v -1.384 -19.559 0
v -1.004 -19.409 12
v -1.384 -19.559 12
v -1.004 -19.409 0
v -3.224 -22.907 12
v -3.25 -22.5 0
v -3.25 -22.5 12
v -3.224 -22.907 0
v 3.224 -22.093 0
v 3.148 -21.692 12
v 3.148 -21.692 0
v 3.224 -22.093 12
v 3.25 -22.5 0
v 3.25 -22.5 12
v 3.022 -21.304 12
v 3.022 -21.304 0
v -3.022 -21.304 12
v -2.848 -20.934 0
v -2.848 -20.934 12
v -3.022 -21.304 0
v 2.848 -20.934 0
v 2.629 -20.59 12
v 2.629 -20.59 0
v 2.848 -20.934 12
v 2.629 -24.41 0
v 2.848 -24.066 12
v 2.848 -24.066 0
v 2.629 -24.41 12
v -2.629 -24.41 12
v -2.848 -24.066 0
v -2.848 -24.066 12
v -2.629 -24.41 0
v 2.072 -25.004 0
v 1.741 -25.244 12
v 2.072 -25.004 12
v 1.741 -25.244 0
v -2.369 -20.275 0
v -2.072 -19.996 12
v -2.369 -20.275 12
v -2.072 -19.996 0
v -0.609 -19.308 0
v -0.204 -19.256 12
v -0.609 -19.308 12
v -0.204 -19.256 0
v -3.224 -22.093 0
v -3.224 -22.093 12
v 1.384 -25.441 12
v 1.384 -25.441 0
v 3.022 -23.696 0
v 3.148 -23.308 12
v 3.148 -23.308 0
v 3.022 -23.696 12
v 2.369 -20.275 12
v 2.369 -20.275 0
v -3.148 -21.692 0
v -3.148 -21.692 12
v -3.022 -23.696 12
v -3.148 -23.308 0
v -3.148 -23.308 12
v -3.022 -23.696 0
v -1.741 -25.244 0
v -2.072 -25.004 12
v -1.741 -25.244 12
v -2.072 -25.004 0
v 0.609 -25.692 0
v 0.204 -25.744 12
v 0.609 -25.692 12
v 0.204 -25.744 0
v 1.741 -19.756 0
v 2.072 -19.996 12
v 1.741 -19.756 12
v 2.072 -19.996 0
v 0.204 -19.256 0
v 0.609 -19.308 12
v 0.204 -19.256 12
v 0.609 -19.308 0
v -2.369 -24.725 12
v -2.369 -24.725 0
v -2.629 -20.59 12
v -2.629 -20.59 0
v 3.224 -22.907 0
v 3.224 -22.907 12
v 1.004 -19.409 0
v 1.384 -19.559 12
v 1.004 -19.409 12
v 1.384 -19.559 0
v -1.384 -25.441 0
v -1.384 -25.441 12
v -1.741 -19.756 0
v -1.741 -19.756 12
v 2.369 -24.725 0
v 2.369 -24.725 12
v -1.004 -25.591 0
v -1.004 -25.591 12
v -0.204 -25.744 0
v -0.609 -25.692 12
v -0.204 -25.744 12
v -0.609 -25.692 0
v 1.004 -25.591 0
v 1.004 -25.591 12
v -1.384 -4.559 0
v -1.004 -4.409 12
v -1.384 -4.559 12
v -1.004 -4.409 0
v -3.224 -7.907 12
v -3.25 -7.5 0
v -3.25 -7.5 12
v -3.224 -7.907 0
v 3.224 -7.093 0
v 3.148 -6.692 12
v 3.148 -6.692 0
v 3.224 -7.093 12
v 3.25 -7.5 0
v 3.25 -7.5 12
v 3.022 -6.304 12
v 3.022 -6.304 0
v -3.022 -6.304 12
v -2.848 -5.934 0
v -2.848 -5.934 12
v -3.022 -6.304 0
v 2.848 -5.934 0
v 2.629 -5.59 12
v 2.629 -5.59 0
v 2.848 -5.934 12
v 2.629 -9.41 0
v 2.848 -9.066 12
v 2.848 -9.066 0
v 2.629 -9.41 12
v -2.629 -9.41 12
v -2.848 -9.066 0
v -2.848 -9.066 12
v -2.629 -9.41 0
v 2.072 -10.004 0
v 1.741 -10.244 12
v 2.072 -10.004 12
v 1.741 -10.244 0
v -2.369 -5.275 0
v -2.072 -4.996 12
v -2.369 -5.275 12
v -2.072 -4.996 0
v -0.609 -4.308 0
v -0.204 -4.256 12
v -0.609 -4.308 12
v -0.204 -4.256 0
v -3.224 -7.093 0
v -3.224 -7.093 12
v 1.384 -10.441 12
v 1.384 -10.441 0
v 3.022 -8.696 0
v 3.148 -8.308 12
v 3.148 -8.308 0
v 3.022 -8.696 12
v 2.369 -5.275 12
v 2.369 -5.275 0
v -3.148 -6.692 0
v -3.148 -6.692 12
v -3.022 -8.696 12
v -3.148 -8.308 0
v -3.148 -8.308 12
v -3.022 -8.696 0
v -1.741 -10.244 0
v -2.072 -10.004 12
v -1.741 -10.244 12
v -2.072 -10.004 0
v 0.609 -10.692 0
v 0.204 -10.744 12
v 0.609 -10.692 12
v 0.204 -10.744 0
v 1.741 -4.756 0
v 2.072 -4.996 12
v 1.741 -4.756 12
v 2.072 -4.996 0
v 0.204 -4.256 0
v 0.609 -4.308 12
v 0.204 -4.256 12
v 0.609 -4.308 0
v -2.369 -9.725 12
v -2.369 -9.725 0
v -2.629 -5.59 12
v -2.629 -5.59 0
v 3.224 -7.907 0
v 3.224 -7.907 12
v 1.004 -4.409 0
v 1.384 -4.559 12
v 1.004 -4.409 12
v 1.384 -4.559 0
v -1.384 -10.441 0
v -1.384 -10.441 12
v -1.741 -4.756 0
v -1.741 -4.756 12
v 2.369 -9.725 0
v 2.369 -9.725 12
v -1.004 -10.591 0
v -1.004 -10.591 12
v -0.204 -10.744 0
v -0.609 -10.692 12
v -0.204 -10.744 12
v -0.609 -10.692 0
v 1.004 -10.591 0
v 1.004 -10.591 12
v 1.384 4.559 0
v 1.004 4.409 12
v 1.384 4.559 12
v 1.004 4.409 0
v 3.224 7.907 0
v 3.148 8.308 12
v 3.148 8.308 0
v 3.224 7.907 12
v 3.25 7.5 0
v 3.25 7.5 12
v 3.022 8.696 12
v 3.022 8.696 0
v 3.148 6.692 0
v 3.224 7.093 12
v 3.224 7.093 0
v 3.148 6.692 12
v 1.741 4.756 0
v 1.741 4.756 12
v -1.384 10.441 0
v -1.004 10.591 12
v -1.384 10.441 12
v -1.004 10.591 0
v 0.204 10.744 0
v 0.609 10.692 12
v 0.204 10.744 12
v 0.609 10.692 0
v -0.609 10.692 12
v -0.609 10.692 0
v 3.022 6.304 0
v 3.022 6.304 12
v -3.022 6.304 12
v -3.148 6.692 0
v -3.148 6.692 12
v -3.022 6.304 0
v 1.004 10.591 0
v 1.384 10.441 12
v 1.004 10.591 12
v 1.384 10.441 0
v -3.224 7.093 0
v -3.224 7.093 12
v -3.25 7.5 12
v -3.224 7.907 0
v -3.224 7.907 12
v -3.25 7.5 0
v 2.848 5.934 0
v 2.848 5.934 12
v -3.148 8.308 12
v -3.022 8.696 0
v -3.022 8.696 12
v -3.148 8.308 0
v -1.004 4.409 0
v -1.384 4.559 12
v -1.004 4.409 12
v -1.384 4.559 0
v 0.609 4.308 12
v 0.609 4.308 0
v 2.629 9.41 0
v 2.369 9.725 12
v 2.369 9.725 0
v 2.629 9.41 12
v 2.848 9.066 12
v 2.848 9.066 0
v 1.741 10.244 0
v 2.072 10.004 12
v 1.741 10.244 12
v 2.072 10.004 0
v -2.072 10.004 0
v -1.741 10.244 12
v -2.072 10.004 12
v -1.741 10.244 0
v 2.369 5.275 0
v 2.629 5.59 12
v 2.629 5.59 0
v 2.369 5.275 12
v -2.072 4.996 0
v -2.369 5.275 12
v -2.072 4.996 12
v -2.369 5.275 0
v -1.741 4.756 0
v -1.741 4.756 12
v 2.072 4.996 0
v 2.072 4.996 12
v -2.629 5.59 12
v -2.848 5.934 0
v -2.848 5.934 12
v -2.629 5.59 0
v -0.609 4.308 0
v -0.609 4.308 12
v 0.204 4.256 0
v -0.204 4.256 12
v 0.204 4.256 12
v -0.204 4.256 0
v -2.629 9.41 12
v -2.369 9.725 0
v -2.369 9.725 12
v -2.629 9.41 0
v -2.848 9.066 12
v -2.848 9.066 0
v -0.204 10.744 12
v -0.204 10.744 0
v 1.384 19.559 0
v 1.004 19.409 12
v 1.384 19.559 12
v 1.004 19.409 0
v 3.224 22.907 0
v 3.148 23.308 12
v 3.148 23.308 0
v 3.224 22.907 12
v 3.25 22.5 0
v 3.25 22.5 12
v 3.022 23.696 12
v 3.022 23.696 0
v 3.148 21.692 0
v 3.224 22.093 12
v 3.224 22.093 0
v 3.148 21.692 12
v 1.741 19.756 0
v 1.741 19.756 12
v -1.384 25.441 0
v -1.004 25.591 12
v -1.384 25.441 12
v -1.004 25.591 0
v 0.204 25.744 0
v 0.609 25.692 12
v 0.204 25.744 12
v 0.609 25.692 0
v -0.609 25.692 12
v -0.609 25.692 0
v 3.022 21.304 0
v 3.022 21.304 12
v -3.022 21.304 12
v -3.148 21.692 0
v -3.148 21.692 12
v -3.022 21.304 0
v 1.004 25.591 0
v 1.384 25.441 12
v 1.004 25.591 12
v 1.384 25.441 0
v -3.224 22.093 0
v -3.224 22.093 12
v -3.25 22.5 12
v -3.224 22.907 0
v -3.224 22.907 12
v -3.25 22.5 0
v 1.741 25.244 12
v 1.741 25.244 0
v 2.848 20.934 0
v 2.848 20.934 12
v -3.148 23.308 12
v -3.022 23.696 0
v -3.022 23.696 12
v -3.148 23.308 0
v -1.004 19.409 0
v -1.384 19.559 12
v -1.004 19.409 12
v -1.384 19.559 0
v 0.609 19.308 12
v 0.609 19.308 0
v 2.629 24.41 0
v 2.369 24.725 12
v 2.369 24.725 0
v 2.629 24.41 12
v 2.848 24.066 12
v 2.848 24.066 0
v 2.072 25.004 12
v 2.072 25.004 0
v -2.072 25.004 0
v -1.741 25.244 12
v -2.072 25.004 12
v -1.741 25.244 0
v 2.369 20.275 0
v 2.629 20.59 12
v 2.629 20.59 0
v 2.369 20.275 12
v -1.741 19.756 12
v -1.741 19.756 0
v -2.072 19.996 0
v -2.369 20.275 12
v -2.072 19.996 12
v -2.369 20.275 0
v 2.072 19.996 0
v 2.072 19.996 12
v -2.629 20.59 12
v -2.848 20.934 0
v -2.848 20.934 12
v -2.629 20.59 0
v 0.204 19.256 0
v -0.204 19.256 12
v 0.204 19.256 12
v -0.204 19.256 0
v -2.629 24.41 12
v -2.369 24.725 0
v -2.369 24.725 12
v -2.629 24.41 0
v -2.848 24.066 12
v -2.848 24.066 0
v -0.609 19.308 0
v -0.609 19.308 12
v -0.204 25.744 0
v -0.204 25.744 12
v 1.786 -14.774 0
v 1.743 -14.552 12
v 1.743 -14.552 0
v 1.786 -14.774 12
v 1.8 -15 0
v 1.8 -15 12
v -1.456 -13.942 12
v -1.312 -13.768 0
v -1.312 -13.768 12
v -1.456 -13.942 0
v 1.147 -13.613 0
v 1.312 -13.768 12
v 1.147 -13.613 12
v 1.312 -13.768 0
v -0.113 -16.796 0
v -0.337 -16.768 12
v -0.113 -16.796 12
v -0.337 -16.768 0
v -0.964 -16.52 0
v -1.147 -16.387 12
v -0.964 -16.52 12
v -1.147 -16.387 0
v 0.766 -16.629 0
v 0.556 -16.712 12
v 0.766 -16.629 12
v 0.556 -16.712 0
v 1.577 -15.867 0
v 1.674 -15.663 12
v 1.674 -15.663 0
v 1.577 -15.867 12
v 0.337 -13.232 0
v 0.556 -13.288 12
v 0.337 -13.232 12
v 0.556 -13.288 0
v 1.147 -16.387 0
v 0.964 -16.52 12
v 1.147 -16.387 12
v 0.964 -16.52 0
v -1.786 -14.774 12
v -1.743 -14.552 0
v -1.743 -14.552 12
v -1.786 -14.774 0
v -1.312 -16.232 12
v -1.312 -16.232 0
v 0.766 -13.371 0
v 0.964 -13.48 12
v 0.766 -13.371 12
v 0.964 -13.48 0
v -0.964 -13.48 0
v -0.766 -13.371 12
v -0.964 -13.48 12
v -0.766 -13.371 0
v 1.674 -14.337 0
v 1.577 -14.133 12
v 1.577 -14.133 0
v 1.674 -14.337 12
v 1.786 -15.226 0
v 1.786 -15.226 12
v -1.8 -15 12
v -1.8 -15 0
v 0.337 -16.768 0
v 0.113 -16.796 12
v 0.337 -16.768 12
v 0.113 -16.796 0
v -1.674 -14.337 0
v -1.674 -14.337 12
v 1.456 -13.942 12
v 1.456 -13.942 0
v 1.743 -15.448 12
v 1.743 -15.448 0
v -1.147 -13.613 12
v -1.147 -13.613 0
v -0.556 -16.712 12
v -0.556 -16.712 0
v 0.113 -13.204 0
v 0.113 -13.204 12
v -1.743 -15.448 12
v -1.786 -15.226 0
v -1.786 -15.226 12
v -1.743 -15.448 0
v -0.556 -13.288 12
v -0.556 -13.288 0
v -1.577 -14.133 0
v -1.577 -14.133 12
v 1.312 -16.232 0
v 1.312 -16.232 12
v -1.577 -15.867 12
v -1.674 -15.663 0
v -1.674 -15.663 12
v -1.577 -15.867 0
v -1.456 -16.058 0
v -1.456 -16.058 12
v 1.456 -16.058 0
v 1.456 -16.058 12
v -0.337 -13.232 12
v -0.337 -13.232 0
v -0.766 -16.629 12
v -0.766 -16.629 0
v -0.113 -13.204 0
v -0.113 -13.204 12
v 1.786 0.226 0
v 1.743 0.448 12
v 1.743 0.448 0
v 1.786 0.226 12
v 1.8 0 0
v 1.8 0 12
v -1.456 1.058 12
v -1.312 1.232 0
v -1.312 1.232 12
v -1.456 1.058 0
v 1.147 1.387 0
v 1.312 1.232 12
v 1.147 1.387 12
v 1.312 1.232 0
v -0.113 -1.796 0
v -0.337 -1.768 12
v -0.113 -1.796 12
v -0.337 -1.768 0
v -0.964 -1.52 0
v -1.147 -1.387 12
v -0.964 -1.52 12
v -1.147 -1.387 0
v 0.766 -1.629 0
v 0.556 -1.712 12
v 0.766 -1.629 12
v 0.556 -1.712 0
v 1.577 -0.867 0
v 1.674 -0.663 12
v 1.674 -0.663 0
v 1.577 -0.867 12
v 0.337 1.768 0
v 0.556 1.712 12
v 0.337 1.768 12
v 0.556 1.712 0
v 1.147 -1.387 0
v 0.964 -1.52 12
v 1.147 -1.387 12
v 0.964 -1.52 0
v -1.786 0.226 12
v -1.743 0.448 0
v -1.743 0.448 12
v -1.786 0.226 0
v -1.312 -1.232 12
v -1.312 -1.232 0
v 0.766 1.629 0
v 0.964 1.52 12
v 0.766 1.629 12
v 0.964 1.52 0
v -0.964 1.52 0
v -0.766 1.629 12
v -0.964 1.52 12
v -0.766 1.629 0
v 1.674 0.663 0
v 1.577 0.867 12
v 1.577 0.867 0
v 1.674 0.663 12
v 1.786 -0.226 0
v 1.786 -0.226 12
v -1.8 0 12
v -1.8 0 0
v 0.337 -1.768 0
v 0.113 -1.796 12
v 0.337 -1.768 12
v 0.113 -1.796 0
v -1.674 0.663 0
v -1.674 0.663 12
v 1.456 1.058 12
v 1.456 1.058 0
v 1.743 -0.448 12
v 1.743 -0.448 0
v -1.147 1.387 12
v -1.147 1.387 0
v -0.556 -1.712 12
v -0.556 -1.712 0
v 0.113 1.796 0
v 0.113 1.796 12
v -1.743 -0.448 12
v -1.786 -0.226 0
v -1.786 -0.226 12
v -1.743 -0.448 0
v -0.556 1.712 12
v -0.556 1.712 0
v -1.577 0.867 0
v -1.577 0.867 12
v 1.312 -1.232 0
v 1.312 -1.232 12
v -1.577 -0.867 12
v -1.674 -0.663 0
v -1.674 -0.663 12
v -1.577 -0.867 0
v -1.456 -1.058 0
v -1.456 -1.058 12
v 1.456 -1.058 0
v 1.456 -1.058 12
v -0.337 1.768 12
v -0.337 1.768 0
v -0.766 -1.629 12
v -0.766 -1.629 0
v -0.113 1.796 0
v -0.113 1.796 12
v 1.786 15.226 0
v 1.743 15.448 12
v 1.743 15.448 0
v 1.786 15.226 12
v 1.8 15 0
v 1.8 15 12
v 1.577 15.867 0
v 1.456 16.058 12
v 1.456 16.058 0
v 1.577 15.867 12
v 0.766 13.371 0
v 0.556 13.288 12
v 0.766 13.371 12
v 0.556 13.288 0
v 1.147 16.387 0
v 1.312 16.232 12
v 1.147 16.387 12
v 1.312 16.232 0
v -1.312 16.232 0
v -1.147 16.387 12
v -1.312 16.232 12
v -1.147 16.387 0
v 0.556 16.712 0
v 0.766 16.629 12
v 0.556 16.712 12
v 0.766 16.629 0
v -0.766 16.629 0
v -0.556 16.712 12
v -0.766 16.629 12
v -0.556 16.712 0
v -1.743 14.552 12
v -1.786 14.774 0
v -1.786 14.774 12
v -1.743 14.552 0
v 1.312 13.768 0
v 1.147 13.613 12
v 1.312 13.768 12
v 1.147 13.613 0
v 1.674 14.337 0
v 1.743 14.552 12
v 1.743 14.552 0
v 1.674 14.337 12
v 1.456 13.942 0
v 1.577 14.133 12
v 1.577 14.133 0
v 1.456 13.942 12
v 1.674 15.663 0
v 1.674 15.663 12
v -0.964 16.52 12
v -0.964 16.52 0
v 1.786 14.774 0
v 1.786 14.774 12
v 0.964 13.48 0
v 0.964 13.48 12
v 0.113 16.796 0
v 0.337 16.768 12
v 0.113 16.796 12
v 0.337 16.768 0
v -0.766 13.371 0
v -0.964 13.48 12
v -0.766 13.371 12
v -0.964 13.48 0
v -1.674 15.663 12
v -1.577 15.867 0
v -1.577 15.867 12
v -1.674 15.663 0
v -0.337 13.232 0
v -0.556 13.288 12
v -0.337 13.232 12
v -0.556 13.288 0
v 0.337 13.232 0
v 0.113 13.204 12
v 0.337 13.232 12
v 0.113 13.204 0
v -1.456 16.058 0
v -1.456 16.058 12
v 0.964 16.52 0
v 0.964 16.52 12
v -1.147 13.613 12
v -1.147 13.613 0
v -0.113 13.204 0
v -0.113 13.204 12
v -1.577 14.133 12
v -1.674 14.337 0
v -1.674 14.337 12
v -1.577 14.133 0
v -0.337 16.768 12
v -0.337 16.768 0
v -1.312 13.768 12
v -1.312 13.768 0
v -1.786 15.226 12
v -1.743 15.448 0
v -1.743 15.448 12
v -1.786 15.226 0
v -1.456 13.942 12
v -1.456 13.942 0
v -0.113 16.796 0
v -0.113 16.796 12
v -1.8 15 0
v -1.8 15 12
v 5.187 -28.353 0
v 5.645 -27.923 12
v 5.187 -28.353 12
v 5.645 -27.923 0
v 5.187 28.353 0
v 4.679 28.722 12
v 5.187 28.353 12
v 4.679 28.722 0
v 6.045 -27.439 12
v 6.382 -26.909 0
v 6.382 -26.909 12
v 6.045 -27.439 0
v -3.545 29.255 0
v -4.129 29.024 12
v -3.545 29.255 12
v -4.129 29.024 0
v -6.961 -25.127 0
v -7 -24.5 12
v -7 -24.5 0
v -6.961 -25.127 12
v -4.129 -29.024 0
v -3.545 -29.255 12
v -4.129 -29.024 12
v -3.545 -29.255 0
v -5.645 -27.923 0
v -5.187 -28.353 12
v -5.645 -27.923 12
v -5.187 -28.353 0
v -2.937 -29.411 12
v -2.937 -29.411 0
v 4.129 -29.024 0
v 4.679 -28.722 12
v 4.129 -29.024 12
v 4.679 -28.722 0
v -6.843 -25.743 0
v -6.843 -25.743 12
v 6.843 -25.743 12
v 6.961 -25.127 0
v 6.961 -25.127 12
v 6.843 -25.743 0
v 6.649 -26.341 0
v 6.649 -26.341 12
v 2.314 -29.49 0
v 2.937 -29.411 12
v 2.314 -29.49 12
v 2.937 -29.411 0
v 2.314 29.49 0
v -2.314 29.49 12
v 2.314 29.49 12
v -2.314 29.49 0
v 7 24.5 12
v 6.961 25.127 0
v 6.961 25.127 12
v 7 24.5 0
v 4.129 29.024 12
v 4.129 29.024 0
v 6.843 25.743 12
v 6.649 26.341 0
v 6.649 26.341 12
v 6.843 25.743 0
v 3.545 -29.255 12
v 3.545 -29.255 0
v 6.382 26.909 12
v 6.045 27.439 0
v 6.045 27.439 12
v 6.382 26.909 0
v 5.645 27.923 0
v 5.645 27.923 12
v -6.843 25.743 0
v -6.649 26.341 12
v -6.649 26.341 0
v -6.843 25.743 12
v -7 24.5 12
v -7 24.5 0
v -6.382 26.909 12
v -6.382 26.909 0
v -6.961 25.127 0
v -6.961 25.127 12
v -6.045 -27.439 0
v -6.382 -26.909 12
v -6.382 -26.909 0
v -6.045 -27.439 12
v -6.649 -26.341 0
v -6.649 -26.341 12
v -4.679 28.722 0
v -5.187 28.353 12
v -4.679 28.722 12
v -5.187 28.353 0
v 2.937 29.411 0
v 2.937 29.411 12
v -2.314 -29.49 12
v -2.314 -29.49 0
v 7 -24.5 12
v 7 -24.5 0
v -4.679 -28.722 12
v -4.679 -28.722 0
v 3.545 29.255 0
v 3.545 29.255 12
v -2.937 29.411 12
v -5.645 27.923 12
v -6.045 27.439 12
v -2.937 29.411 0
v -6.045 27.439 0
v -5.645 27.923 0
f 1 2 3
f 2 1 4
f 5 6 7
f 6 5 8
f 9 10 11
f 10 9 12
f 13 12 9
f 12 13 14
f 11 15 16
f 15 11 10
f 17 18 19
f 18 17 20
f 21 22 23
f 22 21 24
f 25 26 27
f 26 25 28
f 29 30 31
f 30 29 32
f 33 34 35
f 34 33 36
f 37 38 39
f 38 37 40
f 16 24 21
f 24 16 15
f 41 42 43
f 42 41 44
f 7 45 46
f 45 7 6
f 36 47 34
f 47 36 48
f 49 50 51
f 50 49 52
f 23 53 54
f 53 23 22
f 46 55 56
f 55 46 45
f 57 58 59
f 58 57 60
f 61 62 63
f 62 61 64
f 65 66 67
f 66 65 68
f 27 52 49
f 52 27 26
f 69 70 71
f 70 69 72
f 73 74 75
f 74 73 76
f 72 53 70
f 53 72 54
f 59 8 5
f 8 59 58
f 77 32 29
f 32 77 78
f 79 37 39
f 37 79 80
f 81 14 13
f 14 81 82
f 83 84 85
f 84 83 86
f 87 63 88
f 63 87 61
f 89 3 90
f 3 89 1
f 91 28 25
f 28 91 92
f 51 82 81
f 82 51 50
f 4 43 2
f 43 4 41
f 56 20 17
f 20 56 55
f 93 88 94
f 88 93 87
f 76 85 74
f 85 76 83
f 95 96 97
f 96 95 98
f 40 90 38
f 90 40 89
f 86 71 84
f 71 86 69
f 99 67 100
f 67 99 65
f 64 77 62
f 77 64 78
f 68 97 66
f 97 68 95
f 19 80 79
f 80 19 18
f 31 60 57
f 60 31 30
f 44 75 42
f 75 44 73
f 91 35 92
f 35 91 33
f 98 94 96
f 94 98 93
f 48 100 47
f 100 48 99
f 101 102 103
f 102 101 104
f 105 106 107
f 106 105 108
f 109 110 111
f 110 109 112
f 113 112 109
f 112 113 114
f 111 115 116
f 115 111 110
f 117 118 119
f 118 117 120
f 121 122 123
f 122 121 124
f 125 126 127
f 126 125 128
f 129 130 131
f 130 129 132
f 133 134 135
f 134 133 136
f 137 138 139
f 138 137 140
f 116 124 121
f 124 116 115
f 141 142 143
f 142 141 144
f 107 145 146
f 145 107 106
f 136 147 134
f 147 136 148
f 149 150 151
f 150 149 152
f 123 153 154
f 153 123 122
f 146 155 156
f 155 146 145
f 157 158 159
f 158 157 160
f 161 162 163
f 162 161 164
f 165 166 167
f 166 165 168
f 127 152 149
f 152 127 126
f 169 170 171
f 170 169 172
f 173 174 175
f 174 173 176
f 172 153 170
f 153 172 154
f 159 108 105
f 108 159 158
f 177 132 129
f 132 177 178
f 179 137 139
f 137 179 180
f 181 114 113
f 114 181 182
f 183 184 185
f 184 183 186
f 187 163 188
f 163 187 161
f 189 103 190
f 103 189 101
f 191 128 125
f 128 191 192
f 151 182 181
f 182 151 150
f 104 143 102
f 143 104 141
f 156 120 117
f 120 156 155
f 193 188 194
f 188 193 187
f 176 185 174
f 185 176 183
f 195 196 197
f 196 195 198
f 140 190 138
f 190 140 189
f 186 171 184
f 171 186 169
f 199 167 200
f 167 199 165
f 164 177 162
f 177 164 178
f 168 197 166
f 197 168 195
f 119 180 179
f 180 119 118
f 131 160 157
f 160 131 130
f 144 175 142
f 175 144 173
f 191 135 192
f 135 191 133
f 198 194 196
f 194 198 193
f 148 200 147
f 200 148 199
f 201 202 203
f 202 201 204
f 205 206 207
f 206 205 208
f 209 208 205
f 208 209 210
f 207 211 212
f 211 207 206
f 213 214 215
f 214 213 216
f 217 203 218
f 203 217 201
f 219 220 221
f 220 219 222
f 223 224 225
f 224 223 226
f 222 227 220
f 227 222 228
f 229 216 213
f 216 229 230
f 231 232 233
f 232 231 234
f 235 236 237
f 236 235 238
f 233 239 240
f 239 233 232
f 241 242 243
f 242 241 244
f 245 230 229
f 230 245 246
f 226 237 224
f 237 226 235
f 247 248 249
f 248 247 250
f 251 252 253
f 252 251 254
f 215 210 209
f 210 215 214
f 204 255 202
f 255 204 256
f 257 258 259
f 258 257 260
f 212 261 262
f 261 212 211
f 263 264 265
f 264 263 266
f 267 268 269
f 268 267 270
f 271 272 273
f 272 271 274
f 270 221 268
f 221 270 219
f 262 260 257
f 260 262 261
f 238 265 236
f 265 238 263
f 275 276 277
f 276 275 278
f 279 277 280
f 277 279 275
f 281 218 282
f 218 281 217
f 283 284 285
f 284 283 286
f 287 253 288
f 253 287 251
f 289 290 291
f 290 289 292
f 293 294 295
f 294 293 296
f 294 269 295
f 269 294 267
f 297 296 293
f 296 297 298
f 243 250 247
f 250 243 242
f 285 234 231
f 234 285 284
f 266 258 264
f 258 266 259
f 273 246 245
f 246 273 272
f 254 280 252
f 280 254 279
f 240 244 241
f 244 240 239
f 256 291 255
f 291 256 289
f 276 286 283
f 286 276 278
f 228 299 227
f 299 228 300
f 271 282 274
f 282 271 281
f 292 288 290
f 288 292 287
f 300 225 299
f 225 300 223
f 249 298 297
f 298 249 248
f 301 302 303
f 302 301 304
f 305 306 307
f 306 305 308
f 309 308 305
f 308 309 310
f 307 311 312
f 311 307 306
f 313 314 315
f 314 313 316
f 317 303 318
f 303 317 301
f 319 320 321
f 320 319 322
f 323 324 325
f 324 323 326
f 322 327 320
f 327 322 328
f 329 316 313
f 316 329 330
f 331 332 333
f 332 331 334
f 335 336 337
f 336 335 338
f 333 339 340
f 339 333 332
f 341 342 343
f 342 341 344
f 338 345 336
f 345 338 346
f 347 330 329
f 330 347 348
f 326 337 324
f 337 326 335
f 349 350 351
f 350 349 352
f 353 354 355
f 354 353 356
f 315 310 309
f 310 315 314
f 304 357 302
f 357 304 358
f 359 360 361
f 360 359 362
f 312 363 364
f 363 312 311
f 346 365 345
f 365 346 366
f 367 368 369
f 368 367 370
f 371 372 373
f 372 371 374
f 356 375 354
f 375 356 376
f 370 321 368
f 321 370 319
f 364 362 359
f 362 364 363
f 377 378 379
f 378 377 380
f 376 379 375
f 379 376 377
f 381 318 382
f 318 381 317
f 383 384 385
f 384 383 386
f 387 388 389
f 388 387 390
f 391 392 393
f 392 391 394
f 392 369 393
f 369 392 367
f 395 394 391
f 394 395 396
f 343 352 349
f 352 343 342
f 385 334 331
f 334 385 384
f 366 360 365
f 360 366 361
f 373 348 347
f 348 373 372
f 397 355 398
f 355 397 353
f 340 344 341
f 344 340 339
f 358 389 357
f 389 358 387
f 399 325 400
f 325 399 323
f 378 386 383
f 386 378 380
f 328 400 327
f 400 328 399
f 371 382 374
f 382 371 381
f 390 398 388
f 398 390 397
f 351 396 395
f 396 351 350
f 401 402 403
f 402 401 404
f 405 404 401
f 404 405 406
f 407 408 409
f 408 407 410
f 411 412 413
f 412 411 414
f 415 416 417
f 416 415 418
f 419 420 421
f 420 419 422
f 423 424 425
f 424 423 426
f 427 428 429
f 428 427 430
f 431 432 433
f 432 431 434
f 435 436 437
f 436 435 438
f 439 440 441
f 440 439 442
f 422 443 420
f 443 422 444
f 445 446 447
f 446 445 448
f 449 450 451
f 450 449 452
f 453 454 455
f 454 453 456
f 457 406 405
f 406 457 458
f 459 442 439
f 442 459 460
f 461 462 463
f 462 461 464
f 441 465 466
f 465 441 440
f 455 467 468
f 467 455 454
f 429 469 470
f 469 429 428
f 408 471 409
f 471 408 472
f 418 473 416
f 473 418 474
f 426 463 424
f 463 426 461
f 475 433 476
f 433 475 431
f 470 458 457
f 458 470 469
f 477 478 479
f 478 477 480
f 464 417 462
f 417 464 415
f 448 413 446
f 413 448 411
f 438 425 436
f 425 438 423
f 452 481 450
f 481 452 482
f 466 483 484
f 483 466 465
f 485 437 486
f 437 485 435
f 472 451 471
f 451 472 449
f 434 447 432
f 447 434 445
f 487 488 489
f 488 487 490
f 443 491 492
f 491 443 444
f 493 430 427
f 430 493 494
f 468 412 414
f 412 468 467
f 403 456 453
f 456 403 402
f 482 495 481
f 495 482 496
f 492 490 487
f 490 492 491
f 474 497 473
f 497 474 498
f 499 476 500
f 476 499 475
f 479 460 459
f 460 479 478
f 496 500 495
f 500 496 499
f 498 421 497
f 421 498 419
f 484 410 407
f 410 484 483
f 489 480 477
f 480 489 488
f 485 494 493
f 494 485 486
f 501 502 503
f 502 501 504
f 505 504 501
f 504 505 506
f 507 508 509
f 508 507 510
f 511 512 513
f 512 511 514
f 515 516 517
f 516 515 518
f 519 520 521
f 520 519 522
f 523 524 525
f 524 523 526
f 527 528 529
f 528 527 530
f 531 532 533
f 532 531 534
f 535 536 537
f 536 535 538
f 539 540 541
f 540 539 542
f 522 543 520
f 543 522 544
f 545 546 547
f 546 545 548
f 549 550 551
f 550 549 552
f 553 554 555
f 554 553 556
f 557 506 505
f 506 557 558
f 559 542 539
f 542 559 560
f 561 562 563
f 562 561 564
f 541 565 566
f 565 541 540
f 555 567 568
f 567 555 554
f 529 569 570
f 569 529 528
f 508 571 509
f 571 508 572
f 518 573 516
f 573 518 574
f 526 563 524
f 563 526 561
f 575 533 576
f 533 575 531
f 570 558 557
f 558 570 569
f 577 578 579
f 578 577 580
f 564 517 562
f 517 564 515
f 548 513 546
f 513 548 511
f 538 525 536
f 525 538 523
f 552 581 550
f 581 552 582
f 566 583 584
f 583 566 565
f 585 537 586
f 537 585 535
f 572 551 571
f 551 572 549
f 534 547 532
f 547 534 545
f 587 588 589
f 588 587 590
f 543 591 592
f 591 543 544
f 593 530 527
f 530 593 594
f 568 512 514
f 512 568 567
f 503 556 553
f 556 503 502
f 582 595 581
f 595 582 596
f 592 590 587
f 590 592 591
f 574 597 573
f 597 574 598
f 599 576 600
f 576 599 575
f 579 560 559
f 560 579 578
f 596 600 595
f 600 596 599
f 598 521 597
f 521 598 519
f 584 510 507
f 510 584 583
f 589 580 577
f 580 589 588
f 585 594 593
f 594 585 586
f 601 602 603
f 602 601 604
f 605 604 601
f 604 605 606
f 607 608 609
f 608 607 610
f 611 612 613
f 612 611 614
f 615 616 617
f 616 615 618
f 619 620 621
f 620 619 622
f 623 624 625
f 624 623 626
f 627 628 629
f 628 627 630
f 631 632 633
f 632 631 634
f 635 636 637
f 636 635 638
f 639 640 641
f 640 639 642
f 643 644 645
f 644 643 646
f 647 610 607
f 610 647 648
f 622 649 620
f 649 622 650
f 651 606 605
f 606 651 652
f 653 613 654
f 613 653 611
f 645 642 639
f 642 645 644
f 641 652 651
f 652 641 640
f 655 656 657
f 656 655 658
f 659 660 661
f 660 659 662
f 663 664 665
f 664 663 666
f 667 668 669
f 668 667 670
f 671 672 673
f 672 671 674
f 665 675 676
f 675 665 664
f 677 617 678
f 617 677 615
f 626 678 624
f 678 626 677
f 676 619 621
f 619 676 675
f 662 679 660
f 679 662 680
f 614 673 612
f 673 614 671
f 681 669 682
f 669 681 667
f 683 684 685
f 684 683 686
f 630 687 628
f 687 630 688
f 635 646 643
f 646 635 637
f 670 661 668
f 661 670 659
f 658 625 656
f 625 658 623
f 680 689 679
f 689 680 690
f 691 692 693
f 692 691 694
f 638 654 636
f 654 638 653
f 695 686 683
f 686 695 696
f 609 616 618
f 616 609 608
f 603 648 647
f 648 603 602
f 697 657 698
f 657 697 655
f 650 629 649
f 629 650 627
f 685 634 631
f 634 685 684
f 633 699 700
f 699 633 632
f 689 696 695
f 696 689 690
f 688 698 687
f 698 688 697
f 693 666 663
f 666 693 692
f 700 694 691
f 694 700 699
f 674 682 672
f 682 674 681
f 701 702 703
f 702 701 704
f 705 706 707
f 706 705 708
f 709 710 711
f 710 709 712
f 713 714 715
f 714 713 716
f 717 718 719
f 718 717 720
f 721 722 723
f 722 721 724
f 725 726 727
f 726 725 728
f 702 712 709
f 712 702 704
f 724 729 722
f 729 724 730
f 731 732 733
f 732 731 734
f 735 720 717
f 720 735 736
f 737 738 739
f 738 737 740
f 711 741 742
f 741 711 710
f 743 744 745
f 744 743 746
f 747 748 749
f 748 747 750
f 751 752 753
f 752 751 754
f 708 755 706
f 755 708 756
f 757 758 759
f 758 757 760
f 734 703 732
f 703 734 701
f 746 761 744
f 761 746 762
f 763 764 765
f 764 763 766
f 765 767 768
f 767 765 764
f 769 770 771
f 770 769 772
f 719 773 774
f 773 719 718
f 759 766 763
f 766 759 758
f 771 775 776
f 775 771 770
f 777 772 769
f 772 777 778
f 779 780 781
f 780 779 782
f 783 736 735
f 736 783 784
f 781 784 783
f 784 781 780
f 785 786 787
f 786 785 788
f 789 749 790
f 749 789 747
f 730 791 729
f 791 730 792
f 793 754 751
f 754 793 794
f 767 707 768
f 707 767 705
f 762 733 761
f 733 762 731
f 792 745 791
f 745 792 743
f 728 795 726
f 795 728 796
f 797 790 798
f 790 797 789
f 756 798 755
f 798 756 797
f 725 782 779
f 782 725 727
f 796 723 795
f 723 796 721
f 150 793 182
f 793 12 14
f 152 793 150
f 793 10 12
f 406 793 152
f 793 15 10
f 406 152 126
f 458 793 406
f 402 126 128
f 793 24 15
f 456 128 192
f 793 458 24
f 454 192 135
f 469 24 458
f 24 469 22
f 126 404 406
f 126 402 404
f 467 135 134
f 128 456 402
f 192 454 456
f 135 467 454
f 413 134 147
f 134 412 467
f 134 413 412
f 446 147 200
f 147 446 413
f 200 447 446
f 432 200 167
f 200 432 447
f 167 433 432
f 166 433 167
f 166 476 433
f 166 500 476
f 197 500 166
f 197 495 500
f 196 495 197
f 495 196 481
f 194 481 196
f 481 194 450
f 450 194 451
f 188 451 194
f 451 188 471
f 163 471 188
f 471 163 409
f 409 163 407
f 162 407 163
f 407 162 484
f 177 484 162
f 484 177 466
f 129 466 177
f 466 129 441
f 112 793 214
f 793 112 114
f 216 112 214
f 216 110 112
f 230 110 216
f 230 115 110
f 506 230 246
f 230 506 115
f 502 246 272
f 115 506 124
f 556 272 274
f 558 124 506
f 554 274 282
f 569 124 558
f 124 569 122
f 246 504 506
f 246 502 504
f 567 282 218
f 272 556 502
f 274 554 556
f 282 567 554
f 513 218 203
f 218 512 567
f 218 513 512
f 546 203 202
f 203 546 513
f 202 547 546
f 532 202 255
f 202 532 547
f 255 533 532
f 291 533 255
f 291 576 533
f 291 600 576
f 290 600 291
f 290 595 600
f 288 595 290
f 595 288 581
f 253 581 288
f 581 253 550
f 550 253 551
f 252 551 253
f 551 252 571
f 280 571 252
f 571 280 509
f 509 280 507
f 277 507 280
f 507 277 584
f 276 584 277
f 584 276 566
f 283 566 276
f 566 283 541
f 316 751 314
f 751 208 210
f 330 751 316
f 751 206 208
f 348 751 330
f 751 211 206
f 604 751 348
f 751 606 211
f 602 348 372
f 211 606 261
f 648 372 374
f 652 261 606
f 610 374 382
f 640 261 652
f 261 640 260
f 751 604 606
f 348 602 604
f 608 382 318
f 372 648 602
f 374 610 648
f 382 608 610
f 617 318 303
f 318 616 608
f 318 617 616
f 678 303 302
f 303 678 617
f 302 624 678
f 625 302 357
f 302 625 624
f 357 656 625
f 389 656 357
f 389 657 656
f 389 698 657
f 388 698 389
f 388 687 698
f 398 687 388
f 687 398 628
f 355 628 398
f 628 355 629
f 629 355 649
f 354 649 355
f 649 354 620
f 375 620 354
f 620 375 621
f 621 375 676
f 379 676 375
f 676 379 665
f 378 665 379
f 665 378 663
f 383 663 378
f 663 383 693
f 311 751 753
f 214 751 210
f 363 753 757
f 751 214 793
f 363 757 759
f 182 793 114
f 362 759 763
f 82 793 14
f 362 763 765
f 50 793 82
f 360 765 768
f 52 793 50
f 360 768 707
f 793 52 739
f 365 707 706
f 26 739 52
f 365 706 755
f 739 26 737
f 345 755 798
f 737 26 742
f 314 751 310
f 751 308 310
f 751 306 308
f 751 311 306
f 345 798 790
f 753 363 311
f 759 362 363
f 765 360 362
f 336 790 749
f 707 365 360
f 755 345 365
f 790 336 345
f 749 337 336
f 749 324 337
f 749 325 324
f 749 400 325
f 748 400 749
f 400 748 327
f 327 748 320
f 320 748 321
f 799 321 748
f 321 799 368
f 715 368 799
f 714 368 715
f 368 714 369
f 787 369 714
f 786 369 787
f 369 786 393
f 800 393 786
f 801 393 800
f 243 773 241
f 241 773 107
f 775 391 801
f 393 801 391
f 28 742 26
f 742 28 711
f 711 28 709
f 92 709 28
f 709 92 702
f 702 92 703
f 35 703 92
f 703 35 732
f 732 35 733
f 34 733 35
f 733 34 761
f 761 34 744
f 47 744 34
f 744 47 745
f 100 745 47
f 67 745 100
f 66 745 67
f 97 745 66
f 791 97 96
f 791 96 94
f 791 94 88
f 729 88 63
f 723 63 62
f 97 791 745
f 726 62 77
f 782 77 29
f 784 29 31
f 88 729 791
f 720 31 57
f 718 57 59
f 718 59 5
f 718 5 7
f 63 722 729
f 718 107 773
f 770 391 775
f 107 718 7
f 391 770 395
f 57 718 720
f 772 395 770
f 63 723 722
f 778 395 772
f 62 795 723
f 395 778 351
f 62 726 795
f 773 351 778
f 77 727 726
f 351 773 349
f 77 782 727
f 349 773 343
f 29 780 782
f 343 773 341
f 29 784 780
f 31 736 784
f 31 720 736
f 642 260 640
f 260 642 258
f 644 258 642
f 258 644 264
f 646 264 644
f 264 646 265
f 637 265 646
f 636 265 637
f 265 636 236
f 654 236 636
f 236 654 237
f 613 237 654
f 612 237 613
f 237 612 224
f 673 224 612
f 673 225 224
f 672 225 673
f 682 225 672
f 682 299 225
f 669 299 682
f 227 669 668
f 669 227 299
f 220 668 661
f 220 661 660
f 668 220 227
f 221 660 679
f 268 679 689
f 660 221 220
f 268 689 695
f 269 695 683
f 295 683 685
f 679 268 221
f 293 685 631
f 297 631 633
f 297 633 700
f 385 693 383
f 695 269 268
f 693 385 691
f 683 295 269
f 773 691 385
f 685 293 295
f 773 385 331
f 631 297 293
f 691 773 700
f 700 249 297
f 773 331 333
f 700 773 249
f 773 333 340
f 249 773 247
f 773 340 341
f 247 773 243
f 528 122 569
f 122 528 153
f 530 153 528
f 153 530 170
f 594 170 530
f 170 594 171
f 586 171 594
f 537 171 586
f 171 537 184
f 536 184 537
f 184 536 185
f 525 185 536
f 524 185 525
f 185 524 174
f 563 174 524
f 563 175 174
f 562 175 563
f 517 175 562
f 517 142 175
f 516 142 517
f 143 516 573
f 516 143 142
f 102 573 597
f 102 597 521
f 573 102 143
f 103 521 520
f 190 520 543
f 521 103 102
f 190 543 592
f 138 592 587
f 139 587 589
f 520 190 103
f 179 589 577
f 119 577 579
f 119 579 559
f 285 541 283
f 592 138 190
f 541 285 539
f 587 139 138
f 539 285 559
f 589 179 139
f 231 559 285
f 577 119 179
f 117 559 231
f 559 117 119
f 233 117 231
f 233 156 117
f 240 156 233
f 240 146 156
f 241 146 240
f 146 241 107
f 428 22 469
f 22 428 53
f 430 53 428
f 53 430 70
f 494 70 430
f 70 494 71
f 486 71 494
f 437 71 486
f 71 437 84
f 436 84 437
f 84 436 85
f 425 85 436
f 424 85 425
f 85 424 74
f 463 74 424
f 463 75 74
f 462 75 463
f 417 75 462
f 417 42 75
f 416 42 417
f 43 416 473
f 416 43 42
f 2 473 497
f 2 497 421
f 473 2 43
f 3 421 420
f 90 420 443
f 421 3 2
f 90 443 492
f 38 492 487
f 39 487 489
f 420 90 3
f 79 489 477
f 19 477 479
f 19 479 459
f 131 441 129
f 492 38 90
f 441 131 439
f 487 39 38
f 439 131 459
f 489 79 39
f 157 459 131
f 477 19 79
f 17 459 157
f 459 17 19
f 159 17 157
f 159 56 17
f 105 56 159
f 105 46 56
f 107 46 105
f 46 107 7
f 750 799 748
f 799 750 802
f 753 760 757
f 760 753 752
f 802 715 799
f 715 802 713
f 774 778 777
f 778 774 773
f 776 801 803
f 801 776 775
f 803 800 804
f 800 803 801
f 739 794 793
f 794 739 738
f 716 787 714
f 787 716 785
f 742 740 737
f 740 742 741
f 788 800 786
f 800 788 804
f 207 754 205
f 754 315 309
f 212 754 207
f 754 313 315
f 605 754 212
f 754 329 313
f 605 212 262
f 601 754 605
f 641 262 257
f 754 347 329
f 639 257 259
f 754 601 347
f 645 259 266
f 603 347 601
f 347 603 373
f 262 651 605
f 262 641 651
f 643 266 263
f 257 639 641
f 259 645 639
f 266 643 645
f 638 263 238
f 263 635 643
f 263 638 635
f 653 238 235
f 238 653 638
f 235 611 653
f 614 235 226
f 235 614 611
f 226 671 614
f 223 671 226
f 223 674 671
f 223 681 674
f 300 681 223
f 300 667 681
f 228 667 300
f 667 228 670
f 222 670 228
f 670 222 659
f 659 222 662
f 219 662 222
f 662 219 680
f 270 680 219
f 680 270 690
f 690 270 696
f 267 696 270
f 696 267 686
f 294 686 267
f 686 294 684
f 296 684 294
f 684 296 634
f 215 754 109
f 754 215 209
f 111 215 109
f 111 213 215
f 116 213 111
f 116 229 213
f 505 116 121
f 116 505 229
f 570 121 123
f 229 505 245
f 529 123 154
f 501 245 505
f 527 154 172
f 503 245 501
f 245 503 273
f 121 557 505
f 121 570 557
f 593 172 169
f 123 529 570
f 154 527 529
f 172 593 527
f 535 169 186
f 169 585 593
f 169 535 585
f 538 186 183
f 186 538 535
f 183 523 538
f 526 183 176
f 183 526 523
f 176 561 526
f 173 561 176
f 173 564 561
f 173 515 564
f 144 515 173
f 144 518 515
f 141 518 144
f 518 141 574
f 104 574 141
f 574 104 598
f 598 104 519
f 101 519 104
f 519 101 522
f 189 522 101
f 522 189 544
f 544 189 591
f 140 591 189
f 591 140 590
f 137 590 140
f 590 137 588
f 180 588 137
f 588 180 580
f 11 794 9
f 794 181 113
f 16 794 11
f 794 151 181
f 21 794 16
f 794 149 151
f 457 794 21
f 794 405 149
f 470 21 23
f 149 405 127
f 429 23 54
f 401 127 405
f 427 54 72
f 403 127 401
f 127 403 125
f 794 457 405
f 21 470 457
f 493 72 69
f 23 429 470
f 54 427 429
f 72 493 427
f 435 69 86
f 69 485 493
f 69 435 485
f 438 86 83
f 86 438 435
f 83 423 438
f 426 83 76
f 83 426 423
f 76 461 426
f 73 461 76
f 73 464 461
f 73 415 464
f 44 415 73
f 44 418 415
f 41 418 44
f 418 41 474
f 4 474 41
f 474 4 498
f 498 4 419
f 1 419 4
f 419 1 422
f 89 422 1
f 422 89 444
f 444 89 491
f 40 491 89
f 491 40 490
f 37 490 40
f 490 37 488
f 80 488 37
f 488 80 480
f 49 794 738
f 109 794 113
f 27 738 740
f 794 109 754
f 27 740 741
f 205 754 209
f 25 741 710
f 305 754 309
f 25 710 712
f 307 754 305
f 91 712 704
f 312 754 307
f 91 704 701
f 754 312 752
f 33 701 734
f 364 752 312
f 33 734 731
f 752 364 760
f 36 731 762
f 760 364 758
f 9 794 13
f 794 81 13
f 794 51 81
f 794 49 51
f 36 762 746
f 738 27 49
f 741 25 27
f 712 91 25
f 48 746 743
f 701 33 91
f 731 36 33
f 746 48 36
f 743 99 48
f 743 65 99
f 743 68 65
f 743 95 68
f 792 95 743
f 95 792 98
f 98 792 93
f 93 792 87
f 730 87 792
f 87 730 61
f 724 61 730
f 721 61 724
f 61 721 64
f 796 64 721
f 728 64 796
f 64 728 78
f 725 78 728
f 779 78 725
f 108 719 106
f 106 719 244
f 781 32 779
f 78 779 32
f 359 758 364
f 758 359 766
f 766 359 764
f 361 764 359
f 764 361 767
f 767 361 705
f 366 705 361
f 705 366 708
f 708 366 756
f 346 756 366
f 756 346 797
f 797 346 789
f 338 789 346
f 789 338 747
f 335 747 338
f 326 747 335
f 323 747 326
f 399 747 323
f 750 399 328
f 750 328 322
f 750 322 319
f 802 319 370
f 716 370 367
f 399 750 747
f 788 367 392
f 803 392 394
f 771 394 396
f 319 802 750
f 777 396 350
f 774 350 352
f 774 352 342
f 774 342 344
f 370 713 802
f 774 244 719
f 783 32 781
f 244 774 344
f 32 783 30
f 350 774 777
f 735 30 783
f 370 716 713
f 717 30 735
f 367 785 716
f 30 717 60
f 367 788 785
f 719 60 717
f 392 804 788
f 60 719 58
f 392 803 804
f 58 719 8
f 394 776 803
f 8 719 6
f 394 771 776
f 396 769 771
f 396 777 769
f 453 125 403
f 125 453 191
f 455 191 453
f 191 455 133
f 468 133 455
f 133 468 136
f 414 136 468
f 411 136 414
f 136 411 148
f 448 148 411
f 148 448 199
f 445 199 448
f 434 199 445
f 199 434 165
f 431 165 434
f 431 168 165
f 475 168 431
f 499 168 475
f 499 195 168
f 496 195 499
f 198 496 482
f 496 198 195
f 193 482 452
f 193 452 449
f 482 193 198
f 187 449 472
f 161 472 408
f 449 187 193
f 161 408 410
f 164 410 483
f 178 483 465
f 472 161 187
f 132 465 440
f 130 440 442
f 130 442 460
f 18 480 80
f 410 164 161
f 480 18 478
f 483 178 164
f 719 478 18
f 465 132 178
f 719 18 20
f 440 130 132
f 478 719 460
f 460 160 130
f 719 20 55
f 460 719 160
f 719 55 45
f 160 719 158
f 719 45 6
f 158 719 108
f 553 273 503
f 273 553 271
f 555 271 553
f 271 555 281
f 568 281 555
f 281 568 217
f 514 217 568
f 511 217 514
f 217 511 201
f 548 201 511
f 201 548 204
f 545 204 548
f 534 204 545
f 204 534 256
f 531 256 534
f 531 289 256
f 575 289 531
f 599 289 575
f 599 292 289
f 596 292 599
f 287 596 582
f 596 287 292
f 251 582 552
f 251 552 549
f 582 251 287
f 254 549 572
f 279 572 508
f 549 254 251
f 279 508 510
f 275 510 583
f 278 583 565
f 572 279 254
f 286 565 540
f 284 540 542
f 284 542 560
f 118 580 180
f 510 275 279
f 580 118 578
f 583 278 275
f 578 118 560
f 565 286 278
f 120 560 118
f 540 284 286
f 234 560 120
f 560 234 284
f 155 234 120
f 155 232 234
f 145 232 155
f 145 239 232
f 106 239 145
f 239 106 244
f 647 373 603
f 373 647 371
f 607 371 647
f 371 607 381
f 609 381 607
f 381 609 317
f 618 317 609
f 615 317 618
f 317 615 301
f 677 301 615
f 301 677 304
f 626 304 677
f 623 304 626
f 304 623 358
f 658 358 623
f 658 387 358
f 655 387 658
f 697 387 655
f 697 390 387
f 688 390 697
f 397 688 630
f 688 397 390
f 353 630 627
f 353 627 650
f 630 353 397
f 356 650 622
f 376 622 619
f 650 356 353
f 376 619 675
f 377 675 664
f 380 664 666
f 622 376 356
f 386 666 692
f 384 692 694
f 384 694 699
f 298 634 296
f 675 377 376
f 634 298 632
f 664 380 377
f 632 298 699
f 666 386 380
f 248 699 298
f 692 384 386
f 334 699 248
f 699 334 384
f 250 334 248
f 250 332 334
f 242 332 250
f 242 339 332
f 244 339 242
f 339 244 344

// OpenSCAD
$fn = 50;

difference() {
	union() {
		hull() {
			translate(v = [-2.0, 24.5, 0]) {
				cylinder(h = 12, r = 5);
			}
			translate(v = [2.0, 24.5, 0]) {
				cylinder(h = 12, r = 5);
			}
			translate(v = [-2.0, -24.5, 0]) {
				cylinder(h = 12, r = 5);
			}
			translate(v = [2.0, -24.5, 0]) {
				cylinder(h = 12, r = 5);
			}
		}
	}
	union() {
		translate(v = [0.0, -22.5, 0]) {
			translate(v = [0, 0, -100]) {
				cylinder(h = 200, r = 3.25);
			}
		}
		translate(v = [0.0, -7.5, 0]) {
			translate(v = [0, 0, -100]) {
				cylinder(h = 200, r = 3.25);
			}
		}
		translate(v = [0.0, 7.5, 0]) {
			translate(v = [0, 0, -100]) {
				cylinder(h = 200, r = 3.25);
			}
		}
		translate(v = [0.0, 22.5, 0]) {
			translate(v = [0, 0, -100]) {
				cylinder(h = 200, r = 3.25);
			}
		}
		translate(v = [0.0, -22.5, 0]) {
			translate(v = [0, 0, -100]) {
				cylinder(h = 200, r = 1.8);
			}
		}
		translate(v = [0.0, -15.0, 0]) {
			translate(v = [0, 0, -100]) {
				cylinder(h = 200, r = 1.8);
			}
		}
		translate(v = [0.0, -7.5, 0]) {
			translate(v = [0, 0, -100]) {
				cylinder(h = 200, r = 1.8);
			}
		}
		translate(v = [0, 0, -100]) {
			cylinder(h = 200, r = 1.8);
		}
		translate(v = [0.0, 7.5, 0]) {
			translate(v = [0, 0, -100]) {
				cylinder(h = 200, r = 1.8);
			}
		}
		translate(v = [0.0, 15.0, 0]) {
			translate(v = [0, 0, -100]) {
				cylinder(h = 200, r = 1.8);
			}
		}
		translate(v = [0.0, 22.5, 0]) {
			translate(v = [0, 0, -100]) {
				cylinder(h = 200, r = 1.8);
			}
		}
	}
}
